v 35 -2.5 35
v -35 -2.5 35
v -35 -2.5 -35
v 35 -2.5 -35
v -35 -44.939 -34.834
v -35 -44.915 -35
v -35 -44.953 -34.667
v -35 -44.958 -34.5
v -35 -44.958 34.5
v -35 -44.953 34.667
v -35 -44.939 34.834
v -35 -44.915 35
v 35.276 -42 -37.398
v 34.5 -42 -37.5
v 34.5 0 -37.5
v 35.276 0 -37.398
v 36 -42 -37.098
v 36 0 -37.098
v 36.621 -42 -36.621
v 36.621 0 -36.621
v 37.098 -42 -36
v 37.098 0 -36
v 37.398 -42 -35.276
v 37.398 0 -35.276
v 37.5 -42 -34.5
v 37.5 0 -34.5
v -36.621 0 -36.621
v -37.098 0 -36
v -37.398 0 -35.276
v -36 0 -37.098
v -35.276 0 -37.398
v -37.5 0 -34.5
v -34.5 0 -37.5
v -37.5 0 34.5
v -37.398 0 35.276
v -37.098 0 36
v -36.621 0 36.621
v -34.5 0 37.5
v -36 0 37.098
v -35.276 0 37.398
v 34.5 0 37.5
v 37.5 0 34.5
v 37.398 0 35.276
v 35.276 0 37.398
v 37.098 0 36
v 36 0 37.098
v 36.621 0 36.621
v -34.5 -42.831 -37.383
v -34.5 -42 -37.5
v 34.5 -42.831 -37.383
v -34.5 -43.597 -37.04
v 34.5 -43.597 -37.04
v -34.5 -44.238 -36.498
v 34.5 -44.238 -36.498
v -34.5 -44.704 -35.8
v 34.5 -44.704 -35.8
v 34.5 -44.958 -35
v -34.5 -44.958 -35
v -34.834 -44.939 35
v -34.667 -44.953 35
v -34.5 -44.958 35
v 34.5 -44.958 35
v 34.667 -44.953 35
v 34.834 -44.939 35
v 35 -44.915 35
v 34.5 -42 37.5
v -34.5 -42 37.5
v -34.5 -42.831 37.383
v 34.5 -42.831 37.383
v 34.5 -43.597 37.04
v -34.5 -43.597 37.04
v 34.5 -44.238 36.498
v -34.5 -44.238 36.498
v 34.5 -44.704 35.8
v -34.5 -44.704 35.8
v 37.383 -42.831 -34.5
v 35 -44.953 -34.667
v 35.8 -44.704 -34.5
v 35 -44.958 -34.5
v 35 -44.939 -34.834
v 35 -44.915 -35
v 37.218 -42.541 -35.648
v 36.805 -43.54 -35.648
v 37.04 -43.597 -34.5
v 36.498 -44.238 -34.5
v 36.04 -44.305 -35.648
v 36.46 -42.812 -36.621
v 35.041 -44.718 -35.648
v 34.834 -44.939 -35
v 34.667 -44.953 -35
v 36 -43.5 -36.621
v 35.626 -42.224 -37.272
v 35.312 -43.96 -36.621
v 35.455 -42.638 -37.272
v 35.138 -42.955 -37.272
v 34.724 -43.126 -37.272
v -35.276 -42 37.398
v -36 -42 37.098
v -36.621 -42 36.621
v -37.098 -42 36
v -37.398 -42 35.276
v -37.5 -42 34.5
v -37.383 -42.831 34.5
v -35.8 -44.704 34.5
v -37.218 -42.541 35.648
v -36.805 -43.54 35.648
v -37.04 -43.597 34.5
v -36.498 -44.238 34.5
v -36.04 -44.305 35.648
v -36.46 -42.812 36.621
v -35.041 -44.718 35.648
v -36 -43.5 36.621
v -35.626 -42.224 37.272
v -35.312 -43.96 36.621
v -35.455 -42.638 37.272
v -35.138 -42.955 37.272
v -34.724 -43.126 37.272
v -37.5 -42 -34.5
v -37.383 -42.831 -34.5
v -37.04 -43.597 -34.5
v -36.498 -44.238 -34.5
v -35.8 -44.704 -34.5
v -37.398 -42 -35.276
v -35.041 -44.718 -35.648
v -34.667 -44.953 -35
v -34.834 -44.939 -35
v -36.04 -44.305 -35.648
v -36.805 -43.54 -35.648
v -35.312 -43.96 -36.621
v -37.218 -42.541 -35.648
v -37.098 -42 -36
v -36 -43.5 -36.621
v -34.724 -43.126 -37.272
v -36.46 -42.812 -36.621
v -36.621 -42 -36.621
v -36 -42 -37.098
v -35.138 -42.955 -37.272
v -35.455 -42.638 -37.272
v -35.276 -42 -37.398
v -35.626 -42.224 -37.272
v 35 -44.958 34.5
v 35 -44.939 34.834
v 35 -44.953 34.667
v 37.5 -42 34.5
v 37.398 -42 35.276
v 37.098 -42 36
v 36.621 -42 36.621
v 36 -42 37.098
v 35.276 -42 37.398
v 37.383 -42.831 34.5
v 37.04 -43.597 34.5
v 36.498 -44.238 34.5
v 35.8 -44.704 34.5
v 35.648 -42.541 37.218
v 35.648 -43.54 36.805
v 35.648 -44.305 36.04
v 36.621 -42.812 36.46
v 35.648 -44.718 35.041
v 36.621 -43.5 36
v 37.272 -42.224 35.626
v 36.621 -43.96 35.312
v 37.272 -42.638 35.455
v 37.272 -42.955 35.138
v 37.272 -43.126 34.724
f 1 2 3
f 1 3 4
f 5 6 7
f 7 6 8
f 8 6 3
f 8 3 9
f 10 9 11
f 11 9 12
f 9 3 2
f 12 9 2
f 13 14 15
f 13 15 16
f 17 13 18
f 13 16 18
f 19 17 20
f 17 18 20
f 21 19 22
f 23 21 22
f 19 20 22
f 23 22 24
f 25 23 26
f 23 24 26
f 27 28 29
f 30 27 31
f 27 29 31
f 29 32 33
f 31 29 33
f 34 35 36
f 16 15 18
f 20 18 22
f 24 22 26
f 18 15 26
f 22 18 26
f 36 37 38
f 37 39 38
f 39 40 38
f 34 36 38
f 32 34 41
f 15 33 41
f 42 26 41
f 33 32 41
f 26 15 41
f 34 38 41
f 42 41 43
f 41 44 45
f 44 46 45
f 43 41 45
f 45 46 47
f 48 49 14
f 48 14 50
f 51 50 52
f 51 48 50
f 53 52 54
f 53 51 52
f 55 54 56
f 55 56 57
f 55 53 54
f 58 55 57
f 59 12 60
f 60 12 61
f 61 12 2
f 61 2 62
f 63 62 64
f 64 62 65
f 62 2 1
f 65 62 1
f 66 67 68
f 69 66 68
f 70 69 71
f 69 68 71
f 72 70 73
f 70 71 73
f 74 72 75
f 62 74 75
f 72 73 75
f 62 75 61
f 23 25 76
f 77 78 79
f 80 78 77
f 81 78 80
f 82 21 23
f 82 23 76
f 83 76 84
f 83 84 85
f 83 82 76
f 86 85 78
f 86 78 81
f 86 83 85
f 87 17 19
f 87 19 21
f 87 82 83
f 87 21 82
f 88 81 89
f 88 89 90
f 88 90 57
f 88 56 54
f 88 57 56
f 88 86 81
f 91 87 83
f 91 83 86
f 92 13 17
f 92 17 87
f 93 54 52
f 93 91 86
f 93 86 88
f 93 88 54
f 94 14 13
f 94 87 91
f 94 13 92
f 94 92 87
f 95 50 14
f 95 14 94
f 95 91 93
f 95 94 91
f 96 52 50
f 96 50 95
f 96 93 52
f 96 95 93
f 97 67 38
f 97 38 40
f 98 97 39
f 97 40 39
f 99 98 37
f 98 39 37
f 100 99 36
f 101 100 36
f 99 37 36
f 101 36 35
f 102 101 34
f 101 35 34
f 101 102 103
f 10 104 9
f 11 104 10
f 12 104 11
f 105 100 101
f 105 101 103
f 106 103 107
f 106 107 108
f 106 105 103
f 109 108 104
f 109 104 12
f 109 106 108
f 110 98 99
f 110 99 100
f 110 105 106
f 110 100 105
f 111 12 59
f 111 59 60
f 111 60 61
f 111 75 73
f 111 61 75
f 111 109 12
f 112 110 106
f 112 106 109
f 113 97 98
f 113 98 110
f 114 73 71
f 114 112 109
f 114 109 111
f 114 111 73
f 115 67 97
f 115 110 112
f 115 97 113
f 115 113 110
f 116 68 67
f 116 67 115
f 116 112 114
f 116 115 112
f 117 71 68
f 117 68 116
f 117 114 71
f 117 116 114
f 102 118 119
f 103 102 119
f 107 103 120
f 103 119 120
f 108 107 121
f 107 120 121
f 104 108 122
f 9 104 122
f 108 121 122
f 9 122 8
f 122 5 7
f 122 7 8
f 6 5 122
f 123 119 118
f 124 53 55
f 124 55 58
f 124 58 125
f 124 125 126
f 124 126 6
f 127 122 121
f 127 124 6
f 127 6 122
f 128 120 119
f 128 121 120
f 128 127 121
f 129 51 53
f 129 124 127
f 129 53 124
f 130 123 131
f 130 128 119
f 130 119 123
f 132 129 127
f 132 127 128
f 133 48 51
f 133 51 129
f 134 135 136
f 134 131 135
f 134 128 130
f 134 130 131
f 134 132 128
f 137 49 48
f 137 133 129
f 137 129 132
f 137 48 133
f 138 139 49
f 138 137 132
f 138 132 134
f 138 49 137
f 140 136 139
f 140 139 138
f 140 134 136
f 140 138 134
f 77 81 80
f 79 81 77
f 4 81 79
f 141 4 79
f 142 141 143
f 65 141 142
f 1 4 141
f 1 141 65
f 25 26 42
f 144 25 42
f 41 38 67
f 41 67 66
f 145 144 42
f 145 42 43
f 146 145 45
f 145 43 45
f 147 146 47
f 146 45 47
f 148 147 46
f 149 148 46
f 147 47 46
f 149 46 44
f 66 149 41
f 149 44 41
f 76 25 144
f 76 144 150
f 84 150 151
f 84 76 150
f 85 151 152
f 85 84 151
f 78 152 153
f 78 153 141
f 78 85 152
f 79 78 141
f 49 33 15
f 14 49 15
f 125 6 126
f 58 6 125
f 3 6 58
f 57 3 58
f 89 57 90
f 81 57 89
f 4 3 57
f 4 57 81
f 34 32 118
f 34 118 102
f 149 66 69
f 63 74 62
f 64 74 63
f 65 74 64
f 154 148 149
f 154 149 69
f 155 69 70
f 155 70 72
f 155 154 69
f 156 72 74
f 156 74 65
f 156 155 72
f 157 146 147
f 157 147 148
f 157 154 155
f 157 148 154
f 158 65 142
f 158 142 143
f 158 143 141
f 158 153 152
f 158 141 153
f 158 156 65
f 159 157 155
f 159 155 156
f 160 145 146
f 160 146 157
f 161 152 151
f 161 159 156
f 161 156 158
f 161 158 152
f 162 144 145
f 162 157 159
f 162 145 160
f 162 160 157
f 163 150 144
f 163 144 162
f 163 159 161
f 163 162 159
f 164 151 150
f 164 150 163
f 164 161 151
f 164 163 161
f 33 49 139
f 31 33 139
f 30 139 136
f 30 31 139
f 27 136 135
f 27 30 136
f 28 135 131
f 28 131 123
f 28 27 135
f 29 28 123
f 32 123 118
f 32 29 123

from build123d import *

# Parameters (mm, degrees)
F0_W         = 75
F0_H         = 75
F1_DEPTH     = 45
F2_T         = -2.5
F4_T1_DEPTH  = 49.5
F4_T3_DEPTH  = 69
F4_T5_DEPTH  = 69
F4_S9_W      = 3
F4_S9_H      = 3
F4_T10_DEPTH = 3
F4_S15_W     = 3
F4_S15_H     = 3
F4_T16_DEPTH = 3
F4_S21_W     = 3
F4_S21_H     = 3
F4_T22_DEPTH = 3
F4_S27_W     = 3
F4_S27_H     = 3
F4_T28_DEPTH = 3


# Not quite as in the source:
# - a fillet or chamfer that OpenCascade refuses, or shapes differently, is made with other operations: its cross-section is extruded or revolved along the edge and cut away or added
# - a feature of the source that left no trace in its solid (it failed there, or was rolled back) is left out


with BuildPart() as f1:
    # F0 (on Front) → F1 (new body)
    with BuildSketch(Plane.XZ):
        Rectangle(F0_W, F0_H)
    extrude(amount=F1_DEPTH)

    # F2
    f2_openings = [f1.faces().sort_by_distance(p)[0] for p in [
        (0, -45, 0),
    ]]
    offset(amount=F2_T, openings=f2_openings)

    # F4: fillet of radius 3 on 8 edges, made by hand

    # F4_s2 → F4_t1 (cut)
    with BuildSketch(Plane.XZ.offset(-7.5)):
        with BuildLine():
            ThreePointArc((-34.5, 37.5), (-36.6213203436, 36.6213203436), (-37.5, 34.5))
            Line((-37.5, 34.5), (-37.5, 37.5))
            Line((-37.5, 37.5), (-34.5, 37.5))
        make_face()
        with BuildLine():
            ThreePointArc((-34.5, -37.5), (-36.6213203436, -36.6213203436), (-37.5, -34.5))
            Line((-37.5, -34.5), (-37.5, -37.5))
            Line((-37.5, -37.5), (-34.5, -37.5))
        make_face()
        with BuildLine():
            ThreePointArc((34.5, -37.5), (36.6213203436, -36.6213203436), (37.5, -34.5))
            Line((37.5, -34.5), (37.5, -37.5))
            Line((37.5, -37.5), (34.5, -37.5))
        make_face()
        with BuildLine():
            ThreePointArc((37.5, 34.5), (36.6213203436, 36.6213203436), (34.5, 37.5))
            Line((34.5, 37.5), (37.5, 37.5))
            Line((37.5, 37.5), (37.5, 34.5))
        make_face()
    extrude(amount=F4_T1_DEPTH, mode=Mode.SUBTRACT)

    # F4_s4 → F4_t3 (cut)
    with BuildSketch(Plane.YZ.offset(-34.5)):
        with BuildLine():
            ThreePointArc((-42, -37.5), (-44.1213203436, -36.6213203436), (-45, -34.5))
            Line((-45, -34.5), (-45, -37.5))
            Line((-45, -37.5), (-42, -37.5))
        make_face()
        with BuildLine():
            ThreePointArc((-42, 37.5), (-44.1213203436, 36.6213203436), (-45, 34.5))
            Line((-45, 34.5), (-45, 37.5))
            Line((-45, 37.5), (-42, 37.5))
        make_face()
    extrude(amount=F4_T3_DEPTH, mode=Mode.SUBTRACT)

    # F4_s6 → F4_t5 (cut)
    with BuildSketch(Plane.XY.offset(-34.5)):
        with BuildLine():
            ThreePointArc((37.5, -42), (36.6213203436, -44.1213203436), (34.5, -45))
            Line((34.5, -45), (37.5, -45))
            Line((37.5, -45), (37.5, -42))
        make_face()
        with BuildLine():
            ThreePointArc((-37.5, -42), (-36.6213203436, -44.1213203436), (-34.5, -45))
            Line((-34.5, -45), (-37.5, -45))
            Line((-37.5, -45), (-37.5, -42))
        make_face()
    extrude(amount=F4_T5_DEPTH, mode=Mode.SUBTRACT)


with BuildPart() as f4_tool8:
    # F4_s9 → F4_t10 (new body)
    with BuildSketch(Plane.XY.offset(34.5)):
        with Locations((-36, -43.5)):
            Rectangle(F4_S9_W, F4_S9_H)
    extrude(amount=F4_T10_DEPTH)

    # F4_s11 → F4_t12 (revolve, cut)
    with BuildSketch(Plane(origin=(-34.5, -42, 34.5), x_dir=(0.7071067812, 0.7071067812, 0), z_dir=(0.7071067812, -0.7071067812, 0))):
        with BuildLine():
            ThreePointArc((0, -3), (3, 0), (0, 3))
            Line((0, 3), (0, -3))
        make_face()
    revolve(axis=Axis((-34.5, -42, 34.5), (0, 0, 1)), mode=Mode.SUBTRACT)


with BuildPart() as f1_1:
    add(f1.part)

    # F4_t7: cut F4_tool8
    add(f4_tool8.part, mode=Mode.SUBTRACT)


with BuildPart() as f4_tool14:
    # F4_s15 → F4_t16 (new body)
    with BuildSketch(Plane.XY.offset(-34.5)):
        with Locations((-36, -43.5)):
            Rectangle(F4_S15_W, F4_S15_H)
    extrude(amount=-F4_T16_DEPTH)

    # F4_s17 → F4_t18 (revolve, cut)
    with BuildSketch(Plane(origin=(-34.5, -42, -34.5), x_dir=(0.7071067812, 0.7071067812, 0), z_dir=(-0.7071067812, 0.7071067812, 0))):
        with BuildLine():
            ThreePointArc((0, -3), (3, 0), (0, 3))
            Line((0, 3), (0, -3))
        make_face()
    revolve(axis=Axis((-34.5, -42, -34.5), (0, 0, -1)), mode=Mode.SUBTRACT)


with BuildPart() as f1_2:
    add(f1_1.part)

    # F4_t13: cut F4_tool14
    add(f4_tool14.part, mode=Mode.SUBTRACT)


with BuildPart() as f4_tool20:
    # F4_s21 → F4_t22 (new body)
    with BuildSketch(Plane.XY.offset(-34.5)):
        with Locations((36, -43.5)):
            Rectangle(F4_S21_W, F4_S21_H)
    extrude(amount=-F4_T22_DEPTH)

    # F4_s23 → F4_t24 (revolve, cut)
    with BuildSketch(Plane(origin=(34.5, -42, -34.5), x_dir=(-0.7071067812, 0.7071067812, 0), z_dir=(-0.7071067812, -0.7071067812, 0))):
        with BuildLine():
            ThreePointArc((0, -3), (3, 0), (0, 3))
            Line((0, 3), (0, -3))
        make_face()
    revolve(axis=Axis((34.5, -42, -34.5), (0, 0, -1)), mode=Mode.SUBTRACT)


with BuildPart() as f1_3:
    add(f1_2.part)

    # F4_t19: cut F4_tool20
    add(f4_tool20.part, mode=Mode.SUBTRACT)


with BuildPart() as f4_tool26:
    # F4_s27 → F4_t28 (new body)
    with BuildSketch(Plane.YZ.offset(34.5)):
        with Locations((-43.5, 36)):
            Rectangle(F4_S27_W, F4_S27_H)
    extrude(amount=F4_T28_DEPTH)

    # F4_s29 → F4_t30 (revolve, cut)
    with BuildSketch(Plane(origin=(34.5, -42, 34.5), x_dir=(0, 0.7071067812, -0.7071067812), z_dir=(0, -0.7071067812, -0.7071067812))):
        with BuildLine():
            ThreePointArc((0, -3), (3, 0), (0, 3))
            Line((0, 3), (0, -3))
        make_face()
    revolve(axis=Axis((34.5, -42, 34.5), (1, 0, 0)), mode=Mode.SUBTRACT)


with BuildPart() as f1_4:
    add(f1_3.part)

    # F4_t25: cut F4_tool26
    add(f4_tool26.part, mode=Mode.SUBTRACT)


solid = f1_4.part
